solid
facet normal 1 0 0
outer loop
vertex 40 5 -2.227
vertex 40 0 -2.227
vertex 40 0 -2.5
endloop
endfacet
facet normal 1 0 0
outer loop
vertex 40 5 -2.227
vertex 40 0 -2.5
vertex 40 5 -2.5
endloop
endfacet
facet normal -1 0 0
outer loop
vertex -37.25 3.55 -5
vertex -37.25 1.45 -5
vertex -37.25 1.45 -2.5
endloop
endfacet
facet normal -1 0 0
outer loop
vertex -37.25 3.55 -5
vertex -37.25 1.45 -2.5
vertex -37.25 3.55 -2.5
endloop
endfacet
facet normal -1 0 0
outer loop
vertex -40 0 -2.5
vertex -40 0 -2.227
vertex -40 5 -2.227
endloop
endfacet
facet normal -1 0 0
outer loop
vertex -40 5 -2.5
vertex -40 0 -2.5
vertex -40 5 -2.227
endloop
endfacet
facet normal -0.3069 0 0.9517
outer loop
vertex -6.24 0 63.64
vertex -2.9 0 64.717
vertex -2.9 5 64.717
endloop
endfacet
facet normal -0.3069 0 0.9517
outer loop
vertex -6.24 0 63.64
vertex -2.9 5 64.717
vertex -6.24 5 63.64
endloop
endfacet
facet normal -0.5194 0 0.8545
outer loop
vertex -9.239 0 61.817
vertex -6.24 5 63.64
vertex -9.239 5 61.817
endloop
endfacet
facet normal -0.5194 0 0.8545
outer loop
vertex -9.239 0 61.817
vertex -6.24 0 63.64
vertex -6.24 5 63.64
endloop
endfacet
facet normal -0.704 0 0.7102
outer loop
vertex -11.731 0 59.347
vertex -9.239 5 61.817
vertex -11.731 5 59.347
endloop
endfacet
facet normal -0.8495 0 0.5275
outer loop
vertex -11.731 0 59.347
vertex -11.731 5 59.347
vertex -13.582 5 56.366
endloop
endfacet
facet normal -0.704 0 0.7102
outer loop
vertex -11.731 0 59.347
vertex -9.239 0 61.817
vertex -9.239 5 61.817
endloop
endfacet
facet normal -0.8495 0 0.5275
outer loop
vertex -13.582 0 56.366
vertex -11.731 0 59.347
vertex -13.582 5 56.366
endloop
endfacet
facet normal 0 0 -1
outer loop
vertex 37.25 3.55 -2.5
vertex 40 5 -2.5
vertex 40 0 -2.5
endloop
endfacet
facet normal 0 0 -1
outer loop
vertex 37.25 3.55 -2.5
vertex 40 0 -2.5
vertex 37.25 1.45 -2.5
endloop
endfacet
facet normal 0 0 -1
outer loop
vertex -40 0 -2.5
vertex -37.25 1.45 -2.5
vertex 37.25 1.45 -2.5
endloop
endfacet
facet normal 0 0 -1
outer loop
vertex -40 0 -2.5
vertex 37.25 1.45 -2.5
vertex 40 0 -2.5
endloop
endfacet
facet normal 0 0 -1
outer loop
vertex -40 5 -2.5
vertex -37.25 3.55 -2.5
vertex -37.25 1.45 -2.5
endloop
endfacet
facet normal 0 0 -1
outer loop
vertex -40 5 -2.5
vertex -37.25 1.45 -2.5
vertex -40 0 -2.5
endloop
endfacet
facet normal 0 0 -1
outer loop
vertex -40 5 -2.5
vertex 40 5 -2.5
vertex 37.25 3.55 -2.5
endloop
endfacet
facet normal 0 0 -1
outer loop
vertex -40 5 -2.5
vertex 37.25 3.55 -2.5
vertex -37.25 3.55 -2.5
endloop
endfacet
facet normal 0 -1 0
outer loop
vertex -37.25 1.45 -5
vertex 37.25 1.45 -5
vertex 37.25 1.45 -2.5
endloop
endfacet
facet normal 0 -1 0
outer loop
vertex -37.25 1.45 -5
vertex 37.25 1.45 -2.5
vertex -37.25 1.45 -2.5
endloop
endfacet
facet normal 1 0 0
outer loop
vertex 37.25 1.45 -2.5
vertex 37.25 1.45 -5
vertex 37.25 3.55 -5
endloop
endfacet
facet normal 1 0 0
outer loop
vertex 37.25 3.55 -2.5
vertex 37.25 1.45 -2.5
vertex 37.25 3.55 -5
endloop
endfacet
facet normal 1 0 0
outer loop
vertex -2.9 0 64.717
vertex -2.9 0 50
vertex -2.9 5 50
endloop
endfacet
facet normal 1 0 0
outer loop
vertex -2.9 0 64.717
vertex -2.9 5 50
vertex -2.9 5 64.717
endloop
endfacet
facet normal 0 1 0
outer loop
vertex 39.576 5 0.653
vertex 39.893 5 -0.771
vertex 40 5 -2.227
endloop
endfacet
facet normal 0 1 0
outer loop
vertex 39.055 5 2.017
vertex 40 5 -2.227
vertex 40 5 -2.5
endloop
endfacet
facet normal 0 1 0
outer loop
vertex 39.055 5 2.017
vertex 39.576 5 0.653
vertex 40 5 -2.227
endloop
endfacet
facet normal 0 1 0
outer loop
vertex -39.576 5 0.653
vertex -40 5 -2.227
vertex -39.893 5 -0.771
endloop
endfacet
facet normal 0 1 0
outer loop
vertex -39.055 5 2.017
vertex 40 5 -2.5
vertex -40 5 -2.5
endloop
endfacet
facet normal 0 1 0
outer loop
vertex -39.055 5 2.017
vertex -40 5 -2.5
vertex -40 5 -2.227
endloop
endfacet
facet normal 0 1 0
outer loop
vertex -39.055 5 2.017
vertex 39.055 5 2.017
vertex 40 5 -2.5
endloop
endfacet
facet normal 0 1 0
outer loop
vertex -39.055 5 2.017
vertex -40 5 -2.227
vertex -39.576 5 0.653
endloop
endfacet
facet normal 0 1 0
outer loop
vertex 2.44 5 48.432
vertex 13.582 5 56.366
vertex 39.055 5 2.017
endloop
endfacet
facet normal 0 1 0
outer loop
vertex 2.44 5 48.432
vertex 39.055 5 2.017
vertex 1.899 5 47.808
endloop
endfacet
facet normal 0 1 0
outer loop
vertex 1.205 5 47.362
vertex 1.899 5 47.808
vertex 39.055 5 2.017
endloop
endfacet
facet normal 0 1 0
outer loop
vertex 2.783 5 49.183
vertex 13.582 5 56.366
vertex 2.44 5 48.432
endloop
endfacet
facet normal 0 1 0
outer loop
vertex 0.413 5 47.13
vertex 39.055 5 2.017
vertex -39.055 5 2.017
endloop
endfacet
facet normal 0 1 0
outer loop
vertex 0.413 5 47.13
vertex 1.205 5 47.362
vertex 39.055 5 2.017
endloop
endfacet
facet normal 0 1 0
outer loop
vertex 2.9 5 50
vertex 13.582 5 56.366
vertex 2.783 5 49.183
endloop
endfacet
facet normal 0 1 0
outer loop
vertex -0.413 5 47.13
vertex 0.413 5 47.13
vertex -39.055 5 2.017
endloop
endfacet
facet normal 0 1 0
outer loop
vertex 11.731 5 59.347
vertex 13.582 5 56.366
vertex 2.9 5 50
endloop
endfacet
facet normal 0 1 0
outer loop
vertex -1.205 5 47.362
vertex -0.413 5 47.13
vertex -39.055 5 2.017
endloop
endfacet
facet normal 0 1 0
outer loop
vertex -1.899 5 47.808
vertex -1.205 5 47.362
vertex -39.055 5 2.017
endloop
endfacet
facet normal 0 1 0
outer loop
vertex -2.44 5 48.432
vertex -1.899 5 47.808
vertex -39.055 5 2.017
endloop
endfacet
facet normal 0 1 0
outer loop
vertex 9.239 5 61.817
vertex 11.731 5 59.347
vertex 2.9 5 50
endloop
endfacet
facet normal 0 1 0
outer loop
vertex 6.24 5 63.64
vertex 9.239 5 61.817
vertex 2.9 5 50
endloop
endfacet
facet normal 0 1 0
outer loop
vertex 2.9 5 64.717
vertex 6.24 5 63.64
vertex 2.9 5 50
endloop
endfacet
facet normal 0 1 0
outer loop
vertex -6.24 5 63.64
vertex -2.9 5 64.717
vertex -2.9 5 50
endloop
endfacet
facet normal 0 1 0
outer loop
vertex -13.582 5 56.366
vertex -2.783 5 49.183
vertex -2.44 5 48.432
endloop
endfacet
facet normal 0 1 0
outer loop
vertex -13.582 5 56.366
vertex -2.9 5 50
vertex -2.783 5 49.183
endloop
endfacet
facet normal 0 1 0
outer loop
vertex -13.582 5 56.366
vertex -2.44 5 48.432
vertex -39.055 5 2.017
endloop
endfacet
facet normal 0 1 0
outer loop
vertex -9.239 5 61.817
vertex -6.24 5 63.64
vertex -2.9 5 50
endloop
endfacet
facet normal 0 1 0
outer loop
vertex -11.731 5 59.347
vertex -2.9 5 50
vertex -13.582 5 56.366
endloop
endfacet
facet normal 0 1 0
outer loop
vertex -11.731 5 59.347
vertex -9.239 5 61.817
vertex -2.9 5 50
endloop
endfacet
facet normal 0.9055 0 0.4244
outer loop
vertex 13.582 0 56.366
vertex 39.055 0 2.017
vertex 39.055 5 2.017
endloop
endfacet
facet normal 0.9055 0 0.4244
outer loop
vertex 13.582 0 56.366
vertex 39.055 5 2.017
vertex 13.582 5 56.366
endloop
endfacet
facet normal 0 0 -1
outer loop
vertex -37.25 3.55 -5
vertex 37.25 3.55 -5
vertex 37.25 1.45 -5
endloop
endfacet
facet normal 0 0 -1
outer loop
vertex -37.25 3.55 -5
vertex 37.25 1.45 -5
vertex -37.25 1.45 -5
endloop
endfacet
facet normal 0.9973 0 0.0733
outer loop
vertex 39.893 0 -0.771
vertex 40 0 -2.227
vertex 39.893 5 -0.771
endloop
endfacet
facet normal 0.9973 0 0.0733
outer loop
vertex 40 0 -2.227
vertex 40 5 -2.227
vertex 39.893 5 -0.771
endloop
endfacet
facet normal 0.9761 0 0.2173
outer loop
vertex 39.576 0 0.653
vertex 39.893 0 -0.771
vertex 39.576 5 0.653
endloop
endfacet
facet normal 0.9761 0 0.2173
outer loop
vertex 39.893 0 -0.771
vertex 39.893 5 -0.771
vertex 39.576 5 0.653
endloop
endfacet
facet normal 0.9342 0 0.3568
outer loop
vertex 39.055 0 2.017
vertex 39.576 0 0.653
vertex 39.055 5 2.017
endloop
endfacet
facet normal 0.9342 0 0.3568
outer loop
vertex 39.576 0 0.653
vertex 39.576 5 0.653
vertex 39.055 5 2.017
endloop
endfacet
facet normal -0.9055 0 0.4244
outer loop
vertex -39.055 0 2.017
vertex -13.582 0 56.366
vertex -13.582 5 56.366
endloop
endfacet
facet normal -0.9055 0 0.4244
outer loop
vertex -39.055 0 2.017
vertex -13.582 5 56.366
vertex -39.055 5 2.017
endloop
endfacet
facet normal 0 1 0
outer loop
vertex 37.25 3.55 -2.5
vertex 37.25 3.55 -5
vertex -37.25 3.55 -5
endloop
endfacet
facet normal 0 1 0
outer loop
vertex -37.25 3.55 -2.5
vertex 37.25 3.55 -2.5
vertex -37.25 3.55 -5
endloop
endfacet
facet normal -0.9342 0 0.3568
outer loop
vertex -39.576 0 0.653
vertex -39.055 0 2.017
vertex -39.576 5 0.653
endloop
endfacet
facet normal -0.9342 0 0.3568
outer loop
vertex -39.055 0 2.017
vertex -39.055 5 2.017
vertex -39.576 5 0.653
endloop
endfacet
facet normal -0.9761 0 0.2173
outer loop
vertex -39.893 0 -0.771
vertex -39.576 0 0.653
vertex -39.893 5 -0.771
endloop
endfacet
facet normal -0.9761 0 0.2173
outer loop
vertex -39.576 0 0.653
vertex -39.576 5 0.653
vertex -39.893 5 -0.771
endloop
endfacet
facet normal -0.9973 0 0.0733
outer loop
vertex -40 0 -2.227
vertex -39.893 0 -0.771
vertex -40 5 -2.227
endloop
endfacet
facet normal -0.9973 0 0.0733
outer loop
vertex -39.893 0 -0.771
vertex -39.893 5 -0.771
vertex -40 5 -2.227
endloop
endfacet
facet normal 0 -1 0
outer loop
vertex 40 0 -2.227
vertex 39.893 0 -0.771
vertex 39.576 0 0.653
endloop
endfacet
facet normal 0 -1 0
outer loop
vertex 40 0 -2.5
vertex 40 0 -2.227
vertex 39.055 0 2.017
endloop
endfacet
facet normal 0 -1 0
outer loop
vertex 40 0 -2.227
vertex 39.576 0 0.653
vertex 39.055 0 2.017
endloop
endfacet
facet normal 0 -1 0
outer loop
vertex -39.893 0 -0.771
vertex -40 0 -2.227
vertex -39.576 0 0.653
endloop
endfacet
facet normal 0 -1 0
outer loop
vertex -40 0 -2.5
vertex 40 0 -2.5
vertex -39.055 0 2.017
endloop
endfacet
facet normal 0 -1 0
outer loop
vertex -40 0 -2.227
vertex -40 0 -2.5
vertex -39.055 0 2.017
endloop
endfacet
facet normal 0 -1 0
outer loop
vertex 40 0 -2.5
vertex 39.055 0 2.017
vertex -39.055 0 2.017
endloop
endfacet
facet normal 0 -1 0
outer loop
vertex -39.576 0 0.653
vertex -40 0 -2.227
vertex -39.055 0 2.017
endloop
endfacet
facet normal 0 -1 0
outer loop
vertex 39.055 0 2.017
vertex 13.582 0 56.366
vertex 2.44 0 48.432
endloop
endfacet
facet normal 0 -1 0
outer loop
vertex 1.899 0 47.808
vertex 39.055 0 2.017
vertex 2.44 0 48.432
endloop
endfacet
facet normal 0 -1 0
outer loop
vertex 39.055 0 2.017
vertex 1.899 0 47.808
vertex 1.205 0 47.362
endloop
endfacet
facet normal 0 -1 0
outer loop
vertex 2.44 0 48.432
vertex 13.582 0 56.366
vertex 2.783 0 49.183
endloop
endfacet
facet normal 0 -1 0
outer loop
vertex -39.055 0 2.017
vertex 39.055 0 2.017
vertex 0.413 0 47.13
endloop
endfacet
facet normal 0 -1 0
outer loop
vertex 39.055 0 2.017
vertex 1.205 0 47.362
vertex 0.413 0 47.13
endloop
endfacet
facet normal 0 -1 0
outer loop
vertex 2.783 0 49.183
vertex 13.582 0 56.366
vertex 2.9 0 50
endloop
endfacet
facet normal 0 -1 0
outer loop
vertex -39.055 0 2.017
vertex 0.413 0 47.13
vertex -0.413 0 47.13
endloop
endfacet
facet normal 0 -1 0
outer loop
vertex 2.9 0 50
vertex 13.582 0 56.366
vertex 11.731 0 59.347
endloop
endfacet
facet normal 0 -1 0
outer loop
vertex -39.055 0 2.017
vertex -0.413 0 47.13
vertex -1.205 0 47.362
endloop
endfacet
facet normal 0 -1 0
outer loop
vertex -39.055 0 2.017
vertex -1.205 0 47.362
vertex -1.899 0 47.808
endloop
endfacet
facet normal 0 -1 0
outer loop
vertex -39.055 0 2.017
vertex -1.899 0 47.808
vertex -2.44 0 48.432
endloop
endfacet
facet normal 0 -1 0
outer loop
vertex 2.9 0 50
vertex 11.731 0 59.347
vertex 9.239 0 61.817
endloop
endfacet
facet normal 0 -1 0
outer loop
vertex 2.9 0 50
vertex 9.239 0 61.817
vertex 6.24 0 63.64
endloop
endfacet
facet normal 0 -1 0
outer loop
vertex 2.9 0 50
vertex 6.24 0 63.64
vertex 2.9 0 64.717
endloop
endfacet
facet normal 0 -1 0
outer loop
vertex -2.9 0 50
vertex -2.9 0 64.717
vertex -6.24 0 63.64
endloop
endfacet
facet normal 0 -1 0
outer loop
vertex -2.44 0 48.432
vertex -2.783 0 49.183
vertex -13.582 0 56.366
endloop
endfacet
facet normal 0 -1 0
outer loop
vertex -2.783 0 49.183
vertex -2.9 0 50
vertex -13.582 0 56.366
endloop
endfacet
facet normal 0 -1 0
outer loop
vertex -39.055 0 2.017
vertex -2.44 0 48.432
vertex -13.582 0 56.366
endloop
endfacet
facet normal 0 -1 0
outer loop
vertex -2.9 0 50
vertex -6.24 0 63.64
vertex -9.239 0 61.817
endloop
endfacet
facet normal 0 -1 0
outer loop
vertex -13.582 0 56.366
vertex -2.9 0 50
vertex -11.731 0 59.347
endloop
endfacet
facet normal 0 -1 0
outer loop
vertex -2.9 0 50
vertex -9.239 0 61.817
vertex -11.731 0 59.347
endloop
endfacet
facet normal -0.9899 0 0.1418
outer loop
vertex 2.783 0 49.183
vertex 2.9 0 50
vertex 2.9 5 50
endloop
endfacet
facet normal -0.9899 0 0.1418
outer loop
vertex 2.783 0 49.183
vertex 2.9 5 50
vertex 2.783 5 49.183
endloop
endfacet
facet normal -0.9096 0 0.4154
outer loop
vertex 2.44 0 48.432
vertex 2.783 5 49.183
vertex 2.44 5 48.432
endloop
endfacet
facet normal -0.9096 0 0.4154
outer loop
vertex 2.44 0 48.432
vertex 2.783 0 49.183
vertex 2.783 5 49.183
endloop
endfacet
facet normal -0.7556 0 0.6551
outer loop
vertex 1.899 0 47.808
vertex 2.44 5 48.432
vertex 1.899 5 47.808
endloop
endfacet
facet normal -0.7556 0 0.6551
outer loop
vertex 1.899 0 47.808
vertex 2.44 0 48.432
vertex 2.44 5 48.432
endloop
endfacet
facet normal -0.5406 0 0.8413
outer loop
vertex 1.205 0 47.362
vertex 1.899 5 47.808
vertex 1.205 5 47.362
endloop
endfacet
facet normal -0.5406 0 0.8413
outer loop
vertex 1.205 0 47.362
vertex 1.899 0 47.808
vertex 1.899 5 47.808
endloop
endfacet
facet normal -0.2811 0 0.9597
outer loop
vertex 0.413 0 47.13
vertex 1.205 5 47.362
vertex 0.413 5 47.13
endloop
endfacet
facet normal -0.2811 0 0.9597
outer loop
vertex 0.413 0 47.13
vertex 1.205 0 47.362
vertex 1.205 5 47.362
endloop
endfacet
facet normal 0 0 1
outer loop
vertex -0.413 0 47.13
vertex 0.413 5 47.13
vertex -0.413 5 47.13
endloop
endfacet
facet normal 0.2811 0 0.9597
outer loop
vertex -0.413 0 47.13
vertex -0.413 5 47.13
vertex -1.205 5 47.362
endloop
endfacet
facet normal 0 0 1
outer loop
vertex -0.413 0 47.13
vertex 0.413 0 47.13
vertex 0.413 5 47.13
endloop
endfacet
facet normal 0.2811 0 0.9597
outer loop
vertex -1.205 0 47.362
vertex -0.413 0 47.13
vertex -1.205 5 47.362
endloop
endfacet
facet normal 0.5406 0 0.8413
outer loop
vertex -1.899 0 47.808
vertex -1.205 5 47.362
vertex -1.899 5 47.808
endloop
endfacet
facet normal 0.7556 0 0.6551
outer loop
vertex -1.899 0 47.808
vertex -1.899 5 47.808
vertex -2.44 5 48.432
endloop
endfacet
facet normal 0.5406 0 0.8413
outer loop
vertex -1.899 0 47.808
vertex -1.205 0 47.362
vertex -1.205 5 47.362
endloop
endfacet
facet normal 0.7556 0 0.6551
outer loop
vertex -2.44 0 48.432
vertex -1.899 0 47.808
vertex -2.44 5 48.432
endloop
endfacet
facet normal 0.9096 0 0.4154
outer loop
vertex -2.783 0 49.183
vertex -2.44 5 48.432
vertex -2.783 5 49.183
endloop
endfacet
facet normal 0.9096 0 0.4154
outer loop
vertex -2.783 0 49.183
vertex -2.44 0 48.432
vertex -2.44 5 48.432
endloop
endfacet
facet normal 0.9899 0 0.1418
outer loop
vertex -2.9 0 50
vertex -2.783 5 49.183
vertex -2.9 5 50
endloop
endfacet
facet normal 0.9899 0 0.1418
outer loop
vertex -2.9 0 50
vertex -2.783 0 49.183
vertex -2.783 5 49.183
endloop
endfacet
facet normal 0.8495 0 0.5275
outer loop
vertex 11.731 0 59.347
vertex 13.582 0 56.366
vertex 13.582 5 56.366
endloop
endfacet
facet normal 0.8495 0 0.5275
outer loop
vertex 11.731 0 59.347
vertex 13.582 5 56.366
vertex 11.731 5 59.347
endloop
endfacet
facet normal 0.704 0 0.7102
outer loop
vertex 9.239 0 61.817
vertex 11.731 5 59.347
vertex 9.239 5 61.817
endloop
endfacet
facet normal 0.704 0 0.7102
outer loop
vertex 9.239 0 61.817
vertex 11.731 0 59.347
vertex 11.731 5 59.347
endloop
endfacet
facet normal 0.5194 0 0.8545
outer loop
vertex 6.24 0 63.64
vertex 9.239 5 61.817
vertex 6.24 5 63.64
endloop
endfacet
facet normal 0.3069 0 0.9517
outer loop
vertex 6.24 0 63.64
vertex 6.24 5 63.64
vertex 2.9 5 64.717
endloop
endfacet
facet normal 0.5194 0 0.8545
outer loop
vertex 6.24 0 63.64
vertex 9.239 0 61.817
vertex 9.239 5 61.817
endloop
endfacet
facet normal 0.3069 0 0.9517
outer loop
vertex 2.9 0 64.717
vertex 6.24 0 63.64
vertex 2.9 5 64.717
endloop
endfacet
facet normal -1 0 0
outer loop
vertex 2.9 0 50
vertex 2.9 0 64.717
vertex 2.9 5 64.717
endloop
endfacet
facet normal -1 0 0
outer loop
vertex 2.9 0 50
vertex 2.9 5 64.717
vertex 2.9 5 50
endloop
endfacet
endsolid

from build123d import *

# Parameters (mm, degrees)
BOSS_EXTRUDE1_DEPTH = 5
SKETCH3_W           = 80
SKETCH3_H           = 5
BOSS_EXTRUDE2_DEPTH = 5
SKETCH6_W           = 80
SKETCH6_H           = 5
SKETCH6_W_2         = 74.5
SKETCH6_H_2         = 2.1
CUT_EXTRUDE2_DEPTH  = 2.5
FILLET1_R           = 10
CUT_EXTRUDE3_DEPTH  = 5


with BuildPart() as part:
    # Sketch2 → Boss-Extrude1 (new body)
    with BuildSketch(Plane(origin=(0, 0, 0), x_dir=(1, 0, 0), z_dir=(0, 1, 0))):
        with BuildLine():
            Line((-40, 0), (40, 0))
            Line((40, 0), (13.582225242, -56.365780194))
            ThreePointArc((13.582225242, -56.365780194), (0, -65), (-13.582225242, -56.365780194))
            Line((-13.582225242, -56.365780194), (-40, 0))
        make_face()
    extrude(amount=BOSS_EXTRUDE1_DEPTH)

    # Sketch3 → Boss-Extrude2 (add)
    with BuildSketch(Plane(origin=(0, 0, 0), x_dir=(-1, 0, 0), z_dir=(0, 0, -1))):
        with Locations((0, 2.5)):
            Rectangle(SKETCH3_W, SKETCH3_H)
    extrude(amount=BOSS_EXTRUDE2_DEPTH)

    # Sketch6 → Cut-Extrude2 (cut)
    with BuildSketch(Plane(origin=(0, 0, -5), x_dir=(-1, 0, 0), z_dir=(0, 0, -1))):
        with Locations((0, 2.5)):
            Rectangle(SKETCH6_W, SKETCH6_H)
        with Locations((0, 2.5)):
            Rectangle(SKETCH6_W_2, SKETCH6_H_2, mode=Mode.SUBTRACT)
    extrude(amount=-CUT_EXTRUDE2_DEPTH, mode=Mode.SUBTRACT)

    # Fillet1
    fillet1_edges = [part.edges().sort_by_distance(p)[0] for p in [
        (-40, 2.5, 0),
        (40, 2.5, 0),
    ]]
    fillet(fillet1_edges, radius=FILLET1_R)

    # Sketch7 → Cut-Extrude3 (cut)
    with BuildSketch(Plane(origin=(0, 0, 0), x_dir=(-1, 0, 0), z_dir=(0, -1, 0))):
        with BuildLine():
            Line((2.9, -50), (2.9, -64.716996976))
            ThreePointArc((2.9, -64.716996976), (0, -65), (-2.9, -64.716996976))
            Line((-2.9, -64.716996976), (-2.9, -50))
            ThreePointArc((-2.9, -50), (0, -47.1), (2.9, -50))
        make_face()
    extrude(amount=-CUT_EXTRUDE3_DEPTH, mode=Mode.SUBTRACT)


solid = part.part
